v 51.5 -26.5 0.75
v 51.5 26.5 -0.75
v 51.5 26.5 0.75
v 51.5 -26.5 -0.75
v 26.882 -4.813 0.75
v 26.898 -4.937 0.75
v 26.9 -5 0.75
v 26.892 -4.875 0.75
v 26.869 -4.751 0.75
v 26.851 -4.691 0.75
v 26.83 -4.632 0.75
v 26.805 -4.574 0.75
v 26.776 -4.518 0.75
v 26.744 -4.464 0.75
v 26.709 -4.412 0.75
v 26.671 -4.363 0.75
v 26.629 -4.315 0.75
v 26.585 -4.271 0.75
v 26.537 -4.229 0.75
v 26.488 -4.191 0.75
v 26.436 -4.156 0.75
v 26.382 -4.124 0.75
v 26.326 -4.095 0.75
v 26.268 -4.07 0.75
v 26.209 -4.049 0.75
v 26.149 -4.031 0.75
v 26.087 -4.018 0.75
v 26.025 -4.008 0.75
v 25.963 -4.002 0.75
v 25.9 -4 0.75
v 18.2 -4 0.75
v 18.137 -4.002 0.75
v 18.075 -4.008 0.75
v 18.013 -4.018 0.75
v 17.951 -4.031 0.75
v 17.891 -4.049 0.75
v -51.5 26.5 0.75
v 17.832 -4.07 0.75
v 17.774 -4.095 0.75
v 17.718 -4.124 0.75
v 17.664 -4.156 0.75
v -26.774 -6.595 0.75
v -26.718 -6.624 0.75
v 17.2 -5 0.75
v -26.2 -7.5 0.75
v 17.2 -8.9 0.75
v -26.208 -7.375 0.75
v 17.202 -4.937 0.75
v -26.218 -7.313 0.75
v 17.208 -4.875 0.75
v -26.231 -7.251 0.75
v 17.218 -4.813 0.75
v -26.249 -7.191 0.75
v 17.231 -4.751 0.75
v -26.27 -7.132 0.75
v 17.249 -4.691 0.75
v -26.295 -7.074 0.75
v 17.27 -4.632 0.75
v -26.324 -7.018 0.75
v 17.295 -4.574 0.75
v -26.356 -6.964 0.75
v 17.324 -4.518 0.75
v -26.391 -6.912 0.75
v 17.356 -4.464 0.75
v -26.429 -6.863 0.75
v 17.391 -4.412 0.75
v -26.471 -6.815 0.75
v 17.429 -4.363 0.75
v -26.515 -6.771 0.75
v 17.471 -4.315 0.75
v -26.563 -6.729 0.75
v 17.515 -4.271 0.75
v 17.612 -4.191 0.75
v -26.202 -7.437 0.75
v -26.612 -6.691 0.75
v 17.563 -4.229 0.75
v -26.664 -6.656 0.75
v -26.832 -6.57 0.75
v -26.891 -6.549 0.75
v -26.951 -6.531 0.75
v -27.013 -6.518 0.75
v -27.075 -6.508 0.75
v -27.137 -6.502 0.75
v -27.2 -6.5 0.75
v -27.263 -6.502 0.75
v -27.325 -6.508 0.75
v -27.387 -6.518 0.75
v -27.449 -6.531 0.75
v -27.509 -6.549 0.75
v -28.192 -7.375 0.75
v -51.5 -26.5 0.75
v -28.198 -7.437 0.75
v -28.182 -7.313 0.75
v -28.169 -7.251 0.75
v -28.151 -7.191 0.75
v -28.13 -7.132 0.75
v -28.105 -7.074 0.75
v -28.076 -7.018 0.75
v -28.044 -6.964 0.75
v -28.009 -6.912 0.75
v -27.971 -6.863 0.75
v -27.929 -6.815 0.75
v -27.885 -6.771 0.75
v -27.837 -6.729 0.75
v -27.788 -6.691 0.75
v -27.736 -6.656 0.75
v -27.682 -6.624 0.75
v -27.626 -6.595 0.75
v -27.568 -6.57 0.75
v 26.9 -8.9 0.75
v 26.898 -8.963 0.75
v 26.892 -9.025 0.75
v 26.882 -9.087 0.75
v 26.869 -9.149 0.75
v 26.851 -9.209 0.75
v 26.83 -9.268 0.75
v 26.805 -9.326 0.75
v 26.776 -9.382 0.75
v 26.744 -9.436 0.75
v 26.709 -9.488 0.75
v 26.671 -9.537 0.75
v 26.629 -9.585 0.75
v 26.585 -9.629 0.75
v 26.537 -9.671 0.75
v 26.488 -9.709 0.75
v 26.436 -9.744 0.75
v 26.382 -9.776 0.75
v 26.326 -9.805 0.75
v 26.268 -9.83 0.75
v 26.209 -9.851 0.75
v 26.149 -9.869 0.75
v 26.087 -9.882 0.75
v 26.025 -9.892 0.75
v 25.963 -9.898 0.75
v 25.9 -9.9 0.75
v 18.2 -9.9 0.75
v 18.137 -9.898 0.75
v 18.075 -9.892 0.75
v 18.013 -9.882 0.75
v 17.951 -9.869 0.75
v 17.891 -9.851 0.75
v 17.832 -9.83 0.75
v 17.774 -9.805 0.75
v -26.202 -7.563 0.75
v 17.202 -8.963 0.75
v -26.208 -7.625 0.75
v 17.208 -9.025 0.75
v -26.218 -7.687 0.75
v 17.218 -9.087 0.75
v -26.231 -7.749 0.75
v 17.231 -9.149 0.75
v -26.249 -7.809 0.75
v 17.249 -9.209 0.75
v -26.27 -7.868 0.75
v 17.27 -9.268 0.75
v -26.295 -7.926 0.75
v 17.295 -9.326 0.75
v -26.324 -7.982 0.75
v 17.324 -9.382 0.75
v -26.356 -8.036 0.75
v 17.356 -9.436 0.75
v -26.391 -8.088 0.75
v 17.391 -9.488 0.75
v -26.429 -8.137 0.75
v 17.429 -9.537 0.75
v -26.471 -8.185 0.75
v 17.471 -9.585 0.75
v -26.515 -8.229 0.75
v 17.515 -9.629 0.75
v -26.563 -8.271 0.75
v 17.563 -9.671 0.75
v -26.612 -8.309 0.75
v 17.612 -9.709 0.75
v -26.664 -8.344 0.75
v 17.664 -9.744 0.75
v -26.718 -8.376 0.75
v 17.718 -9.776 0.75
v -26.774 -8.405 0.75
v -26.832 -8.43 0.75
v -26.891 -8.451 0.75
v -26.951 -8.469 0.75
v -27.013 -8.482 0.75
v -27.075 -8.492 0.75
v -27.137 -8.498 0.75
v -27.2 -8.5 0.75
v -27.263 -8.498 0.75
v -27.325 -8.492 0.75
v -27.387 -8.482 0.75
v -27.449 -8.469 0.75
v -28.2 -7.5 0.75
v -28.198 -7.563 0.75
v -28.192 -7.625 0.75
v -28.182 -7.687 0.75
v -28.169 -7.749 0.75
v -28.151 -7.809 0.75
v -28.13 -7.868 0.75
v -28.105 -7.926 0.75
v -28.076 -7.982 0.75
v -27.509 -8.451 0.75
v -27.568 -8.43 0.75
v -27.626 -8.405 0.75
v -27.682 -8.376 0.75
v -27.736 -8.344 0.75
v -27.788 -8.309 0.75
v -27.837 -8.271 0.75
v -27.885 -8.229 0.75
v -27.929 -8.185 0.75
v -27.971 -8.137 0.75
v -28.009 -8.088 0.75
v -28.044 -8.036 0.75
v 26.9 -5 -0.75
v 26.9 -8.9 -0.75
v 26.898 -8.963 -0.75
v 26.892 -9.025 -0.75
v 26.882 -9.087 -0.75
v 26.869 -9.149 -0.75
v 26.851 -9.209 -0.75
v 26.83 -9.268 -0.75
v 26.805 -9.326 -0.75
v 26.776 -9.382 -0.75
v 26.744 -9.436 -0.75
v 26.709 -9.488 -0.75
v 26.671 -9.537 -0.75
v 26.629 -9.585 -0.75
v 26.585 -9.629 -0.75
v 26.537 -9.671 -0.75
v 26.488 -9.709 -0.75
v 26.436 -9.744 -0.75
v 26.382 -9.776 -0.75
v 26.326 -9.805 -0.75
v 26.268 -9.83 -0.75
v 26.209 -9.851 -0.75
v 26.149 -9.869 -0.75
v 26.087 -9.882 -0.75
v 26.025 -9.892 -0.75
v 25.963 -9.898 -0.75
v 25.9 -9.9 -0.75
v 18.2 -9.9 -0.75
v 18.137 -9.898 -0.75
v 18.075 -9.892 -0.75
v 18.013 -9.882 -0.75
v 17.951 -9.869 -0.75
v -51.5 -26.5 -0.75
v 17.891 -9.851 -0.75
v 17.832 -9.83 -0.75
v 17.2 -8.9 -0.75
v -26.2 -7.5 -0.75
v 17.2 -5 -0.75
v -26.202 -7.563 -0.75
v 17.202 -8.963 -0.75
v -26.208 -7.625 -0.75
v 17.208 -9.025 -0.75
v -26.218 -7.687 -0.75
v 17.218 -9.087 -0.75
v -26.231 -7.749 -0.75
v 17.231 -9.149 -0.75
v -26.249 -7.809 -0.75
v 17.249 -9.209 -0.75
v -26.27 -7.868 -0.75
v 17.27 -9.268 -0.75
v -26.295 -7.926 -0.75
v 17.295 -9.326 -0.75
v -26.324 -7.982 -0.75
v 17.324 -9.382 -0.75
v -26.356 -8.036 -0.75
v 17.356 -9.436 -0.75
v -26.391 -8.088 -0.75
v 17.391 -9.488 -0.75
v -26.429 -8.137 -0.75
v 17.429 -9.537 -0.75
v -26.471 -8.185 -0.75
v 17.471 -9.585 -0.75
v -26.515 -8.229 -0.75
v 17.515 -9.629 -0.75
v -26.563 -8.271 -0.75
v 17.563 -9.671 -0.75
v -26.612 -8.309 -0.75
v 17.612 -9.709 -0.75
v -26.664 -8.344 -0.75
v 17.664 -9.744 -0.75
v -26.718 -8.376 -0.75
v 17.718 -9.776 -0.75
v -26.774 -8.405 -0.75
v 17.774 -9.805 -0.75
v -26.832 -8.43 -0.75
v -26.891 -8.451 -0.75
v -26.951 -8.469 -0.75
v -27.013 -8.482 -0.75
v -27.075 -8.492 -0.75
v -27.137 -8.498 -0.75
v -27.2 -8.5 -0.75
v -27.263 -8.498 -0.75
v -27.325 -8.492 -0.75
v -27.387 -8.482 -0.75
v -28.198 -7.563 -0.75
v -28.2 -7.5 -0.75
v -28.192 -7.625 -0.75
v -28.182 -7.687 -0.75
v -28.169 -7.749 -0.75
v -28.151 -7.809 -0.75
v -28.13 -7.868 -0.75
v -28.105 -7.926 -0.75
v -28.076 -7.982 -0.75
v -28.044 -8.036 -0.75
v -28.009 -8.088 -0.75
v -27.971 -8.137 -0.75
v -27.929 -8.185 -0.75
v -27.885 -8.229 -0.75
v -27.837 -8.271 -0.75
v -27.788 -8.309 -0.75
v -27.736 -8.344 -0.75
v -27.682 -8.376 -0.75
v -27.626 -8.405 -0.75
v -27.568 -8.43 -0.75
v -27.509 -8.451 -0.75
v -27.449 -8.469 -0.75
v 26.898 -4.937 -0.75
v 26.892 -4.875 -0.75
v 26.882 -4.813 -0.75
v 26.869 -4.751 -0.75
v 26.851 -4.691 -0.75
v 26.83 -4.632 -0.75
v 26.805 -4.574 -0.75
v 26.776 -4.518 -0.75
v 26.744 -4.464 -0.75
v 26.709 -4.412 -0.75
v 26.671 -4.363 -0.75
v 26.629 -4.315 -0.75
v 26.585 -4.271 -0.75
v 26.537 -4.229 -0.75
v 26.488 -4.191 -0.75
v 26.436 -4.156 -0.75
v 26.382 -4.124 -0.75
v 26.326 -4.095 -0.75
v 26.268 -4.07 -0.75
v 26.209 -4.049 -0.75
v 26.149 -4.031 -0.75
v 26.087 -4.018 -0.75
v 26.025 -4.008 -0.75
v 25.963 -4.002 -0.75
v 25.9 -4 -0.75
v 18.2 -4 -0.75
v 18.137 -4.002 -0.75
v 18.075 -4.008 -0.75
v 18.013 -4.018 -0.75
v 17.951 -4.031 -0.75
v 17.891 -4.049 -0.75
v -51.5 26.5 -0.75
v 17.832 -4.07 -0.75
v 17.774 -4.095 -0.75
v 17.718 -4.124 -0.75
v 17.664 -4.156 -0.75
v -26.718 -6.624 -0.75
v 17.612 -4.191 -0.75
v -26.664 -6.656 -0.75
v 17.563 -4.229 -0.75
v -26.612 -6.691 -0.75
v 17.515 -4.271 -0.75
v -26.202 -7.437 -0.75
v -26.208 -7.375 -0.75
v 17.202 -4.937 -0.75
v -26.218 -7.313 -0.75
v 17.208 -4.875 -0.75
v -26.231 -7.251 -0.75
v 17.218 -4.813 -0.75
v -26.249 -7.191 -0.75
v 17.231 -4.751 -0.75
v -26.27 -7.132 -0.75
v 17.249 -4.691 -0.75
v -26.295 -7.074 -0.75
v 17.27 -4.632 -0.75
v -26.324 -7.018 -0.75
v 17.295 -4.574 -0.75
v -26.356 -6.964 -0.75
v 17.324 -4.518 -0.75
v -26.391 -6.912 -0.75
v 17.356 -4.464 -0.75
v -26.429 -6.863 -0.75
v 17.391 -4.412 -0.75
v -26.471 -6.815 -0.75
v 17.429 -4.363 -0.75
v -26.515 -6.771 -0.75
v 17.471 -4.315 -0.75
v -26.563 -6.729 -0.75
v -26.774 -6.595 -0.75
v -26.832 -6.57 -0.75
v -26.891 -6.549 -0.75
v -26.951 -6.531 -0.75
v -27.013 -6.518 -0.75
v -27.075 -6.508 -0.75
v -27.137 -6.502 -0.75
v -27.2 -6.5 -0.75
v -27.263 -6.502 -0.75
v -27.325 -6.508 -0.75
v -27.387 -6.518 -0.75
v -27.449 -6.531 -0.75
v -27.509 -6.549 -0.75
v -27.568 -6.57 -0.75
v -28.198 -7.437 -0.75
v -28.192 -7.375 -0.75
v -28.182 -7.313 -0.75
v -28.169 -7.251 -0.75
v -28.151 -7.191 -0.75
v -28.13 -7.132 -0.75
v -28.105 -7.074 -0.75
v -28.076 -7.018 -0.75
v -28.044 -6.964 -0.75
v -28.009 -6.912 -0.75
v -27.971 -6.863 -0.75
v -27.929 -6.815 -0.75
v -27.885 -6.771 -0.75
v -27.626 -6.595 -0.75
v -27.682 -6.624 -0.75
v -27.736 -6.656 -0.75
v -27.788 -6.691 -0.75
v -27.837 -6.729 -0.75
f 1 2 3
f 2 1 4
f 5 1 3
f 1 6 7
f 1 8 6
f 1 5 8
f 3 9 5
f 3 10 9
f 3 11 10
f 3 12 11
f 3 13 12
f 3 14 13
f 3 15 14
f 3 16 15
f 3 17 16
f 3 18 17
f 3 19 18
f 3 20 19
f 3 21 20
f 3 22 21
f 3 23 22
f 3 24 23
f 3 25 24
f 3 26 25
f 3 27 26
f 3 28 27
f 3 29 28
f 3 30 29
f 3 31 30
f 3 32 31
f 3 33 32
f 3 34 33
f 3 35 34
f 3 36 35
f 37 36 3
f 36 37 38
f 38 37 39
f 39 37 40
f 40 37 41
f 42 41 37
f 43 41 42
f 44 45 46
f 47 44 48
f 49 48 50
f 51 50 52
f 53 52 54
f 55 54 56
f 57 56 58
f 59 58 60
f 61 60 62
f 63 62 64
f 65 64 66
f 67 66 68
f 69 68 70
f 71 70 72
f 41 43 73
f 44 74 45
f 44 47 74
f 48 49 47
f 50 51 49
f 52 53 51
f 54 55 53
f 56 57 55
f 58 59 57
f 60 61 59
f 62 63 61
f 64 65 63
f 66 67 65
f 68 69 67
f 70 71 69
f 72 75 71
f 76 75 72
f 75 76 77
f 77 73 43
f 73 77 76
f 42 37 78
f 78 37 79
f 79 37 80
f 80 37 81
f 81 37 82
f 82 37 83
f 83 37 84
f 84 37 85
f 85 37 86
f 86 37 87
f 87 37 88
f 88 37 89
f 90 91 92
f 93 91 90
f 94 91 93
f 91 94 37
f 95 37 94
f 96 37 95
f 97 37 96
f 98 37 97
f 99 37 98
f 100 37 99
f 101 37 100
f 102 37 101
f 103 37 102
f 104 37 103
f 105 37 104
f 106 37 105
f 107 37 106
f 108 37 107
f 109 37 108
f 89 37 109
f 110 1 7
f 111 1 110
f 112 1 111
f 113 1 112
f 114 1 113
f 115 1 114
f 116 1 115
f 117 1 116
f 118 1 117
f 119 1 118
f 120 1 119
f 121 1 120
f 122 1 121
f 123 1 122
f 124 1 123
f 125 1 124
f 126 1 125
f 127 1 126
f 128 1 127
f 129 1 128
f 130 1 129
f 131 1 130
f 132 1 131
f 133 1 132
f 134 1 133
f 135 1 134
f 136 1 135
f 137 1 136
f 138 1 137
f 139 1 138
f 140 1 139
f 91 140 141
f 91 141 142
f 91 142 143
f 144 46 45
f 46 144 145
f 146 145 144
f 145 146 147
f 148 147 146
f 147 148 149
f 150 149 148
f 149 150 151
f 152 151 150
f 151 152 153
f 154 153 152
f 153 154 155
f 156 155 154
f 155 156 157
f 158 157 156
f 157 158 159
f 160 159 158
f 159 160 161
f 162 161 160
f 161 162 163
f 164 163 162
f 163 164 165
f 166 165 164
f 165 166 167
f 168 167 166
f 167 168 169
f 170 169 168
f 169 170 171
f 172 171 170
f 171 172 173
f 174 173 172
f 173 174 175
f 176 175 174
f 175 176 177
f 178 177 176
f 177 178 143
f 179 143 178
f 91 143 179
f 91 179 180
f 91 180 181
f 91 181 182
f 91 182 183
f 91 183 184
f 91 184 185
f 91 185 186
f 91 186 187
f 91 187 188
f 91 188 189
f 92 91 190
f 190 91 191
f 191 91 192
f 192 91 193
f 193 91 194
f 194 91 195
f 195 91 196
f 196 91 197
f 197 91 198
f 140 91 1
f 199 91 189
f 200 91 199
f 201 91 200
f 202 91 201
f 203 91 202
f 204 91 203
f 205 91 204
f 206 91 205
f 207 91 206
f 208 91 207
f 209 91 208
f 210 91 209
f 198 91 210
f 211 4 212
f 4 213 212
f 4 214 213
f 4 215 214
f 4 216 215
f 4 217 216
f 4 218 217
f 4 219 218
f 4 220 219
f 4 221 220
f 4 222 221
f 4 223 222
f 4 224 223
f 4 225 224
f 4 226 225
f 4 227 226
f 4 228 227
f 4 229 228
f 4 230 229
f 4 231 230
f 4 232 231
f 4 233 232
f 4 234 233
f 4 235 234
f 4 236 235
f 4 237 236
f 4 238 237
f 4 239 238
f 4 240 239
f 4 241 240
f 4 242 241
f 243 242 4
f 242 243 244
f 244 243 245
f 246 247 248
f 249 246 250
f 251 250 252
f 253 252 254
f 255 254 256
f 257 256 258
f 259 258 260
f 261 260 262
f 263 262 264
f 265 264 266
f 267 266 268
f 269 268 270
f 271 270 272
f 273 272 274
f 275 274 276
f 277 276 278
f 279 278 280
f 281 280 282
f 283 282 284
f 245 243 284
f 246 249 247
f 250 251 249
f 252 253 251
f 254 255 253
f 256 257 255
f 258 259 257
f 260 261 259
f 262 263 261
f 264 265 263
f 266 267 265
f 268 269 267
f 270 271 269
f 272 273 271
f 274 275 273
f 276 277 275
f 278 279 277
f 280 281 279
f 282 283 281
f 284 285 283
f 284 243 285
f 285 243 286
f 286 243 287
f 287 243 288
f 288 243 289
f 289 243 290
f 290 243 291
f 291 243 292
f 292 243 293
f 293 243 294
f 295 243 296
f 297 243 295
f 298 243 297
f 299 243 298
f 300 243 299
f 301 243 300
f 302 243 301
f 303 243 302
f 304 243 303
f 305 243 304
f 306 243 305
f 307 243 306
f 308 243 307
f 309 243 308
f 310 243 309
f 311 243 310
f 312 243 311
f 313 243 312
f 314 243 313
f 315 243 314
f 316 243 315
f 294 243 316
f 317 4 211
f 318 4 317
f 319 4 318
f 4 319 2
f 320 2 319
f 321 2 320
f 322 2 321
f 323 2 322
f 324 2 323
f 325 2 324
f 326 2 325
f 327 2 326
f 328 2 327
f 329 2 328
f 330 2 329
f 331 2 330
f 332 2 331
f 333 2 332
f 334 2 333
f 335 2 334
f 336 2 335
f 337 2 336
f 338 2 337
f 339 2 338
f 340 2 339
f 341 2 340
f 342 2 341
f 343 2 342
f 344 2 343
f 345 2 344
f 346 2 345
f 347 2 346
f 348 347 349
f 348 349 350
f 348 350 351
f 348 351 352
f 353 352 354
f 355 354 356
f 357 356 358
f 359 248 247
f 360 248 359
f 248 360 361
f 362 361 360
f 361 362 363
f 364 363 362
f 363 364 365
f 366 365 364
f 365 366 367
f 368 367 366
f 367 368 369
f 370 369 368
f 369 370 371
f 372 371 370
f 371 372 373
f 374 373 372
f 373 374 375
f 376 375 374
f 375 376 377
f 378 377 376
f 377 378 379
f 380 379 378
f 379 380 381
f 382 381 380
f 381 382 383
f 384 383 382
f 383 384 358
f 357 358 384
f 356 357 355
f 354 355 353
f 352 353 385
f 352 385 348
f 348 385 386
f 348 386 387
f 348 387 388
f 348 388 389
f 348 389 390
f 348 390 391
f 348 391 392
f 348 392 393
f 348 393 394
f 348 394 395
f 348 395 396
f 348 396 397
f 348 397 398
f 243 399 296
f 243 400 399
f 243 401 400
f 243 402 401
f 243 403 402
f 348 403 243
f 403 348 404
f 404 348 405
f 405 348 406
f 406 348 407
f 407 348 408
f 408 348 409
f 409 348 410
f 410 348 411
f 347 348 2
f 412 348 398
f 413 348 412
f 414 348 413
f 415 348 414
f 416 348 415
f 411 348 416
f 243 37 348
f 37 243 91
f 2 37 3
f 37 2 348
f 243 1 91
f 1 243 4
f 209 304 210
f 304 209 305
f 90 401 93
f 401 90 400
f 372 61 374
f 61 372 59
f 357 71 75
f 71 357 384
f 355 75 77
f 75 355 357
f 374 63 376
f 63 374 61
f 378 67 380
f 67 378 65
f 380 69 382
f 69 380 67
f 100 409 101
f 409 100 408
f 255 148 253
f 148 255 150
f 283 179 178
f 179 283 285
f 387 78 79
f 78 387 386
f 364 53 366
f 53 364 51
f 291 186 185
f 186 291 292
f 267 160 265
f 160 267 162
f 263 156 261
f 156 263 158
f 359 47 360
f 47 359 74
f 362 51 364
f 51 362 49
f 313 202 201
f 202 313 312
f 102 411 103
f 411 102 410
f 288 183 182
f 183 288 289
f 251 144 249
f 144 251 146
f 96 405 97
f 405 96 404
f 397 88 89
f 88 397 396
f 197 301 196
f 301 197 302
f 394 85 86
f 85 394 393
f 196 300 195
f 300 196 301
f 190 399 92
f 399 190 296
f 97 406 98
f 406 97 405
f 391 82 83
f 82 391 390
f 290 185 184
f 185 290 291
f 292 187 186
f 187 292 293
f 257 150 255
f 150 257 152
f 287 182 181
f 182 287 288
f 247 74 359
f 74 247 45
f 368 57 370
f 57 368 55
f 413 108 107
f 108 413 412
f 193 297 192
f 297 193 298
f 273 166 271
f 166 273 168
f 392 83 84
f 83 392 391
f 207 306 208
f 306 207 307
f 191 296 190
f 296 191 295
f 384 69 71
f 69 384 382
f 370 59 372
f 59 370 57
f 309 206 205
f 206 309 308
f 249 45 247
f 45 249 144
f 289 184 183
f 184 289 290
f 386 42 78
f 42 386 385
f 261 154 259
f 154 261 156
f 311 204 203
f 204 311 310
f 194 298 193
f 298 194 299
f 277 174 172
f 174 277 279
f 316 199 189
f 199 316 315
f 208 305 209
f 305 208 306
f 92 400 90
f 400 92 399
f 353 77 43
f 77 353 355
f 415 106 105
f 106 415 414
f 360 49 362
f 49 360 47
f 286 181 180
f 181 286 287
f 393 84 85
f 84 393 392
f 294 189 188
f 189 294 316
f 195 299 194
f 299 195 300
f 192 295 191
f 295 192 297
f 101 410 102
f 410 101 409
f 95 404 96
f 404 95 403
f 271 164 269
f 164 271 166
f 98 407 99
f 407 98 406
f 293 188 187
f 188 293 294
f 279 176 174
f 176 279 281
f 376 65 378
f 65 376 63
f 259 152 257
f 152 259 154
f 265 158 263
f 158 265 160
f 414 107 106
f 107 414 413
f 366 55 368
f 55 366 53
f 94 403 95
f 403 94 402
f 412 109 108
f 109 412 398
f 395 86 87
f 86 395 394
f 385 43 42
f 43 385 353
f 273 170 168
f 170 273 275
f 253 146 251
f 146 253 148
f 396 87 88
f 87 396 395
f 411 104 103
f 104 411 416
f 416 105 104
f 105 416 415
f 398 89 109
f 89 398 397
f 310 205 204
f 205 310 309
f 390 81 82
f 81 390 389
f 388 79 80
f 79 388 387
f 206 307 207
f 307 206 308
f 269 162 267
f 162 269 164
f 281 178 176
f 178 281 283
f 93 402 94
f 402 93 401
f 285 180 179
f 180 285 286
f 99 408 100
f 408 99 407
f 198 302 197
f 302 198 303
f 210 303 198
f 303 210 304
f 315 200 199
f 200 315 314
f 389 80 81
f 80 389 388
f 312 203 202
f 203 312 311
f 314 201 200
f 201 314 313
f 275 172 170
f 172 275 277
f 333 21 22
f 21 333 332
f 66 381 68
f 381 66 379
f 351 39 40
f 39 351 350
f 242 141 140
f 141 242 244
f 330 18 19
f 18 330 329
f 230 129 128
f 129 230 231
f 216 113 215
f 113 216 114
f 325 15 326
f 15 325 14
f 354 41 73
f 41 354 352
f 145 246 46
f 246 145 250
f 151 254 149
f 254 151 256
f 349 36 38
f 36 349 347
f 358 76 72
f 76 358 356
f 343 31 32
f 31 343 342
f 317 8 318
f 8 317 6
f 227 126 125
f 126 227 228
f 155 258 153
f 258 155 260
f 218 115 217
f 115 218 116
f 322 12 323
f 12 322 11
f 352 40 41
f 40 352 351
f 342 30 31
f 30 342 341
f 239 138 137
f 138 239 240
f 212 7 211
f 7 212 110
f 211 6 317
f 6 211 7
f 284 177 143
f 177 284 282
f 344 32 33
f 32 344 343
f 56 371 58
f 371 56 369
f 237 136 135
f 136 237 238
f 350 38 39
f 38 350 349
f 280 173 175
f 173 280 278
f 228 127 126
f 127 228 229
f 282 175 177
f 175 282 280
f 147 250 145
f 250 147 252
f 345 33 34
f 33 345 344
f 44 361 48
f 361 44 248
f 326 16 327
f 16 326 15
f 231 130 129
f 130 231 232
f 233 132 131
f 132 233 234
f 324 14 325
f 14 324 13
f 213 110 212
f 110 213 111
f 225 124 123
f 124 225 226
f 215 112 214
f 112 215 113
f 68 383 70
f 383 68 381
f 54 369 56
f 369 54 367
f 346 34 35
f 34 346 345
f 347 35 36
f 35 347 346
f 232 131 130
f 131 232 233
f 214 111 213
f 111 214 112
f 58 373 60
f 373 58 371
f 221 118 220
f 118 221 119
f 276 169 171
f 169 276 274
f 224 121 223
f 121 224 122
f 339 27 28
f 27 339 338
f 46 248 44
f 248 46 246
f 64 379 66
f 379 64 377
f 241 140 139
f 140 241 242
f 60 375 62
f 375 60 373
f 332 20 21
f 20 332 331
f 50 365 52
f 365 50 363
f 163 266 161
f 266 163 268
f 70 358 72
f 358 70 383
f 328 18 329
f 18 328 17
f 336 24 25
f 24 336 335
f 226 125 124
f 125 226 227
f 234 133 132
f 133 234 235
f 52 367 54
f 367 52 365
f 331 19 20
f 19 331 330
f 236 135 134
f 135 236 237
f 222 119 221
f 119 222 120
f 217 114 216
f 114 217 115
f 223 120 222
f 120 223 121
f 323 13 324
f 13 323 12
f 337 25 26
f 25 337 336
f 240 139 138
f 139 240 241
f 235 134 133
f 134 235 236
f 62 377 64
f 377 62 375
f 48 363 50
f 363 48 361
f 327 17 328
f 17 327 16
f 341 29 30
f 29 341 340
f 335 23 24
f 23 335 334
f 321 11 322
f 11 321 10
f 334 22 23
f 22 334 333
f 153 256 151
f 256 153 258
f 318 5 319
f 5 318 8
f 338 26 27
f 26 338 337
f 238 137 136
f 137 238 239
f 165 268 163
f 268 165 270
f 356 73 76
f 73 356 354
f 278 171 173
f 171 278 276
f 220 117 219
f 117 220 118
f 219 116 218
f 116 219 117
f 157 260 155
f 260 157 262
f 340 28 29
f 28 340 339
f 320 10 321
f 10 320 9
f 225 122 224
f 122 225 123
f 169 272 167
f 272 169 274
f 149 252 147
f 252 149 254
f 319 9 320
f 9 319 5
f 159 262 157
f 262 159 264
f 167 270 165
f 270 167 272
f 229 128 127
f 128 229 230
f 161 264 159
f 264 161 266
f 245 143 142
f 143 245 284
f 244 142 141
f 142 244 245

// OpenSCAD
//CELICKO PREDNI
//---------------------------------------
$fn=100;
//PARAMETRY CELICKA OD VYROBCE
//rozměr čelíčka
celicko_x=103;
celicko_y=53;
celicko_z=1.5;

//otvory v celisku od vyrobce
celicko_dira_prumer=3.5;
celicko_dira_souradniceX=95.02/2; //souradnice od stredu celicka
celicko_dira_souradniceY=45/2;    //souradnice od stredu celicka
//---------------------------------------

//PRUMER FREZY
freza_prumer=2;

//OTVORY FREZA
//otvor_1 - pro LED
otvor1_prumer=2;
otvor1_souradniceX=-27.2; //souradnice od stredu celicka
otvor1_souradniceY=-7.5; //souradnice od stredu celicka

//otvor_2 - pro vypinac
otvor2_rozmerX=7.7; //rozměry čisté bez úprav pro frézování
otvor2_rozmerY=5.9; //rozměry čisté bez úprav pro frézování
otvor2_souradniceX=22.05; //souradnice od stredu celicka
otvor2_souradniceY=-6.95; //souradnice od stredu celicka
//---------------------------------------

CELICKO_VYSLEDNE();

module CELICKO_VYSLEDNE(){
    difference() {
        CELICKO_OD_VYROBCE();
    
        //otvor1
        translate([otvor1_souradniceX,otvor1_souradniceY,0])  
            cylinder(celicko_z+0.01, d=otvor1_prumer, center=true);   

        //otvor2
        translate([otvor2_souradniceX,otvor2_souradniceY,0])  
            minkowski() {
                cube([otvor2_rozmerX, otvor2_rozmerY-freza_prumer, celicko_z], center=true);
                cylinder(r=freza_prumer/2,h=0.01, center=true);
            } 
    } 
} 

module CELICKO_OD_VYROBCE(){
    difference() {
        cube([celicko_x,celicko_y,celicko_z],center=true);

/*
//otvory na srouby    
translate([celicko_dira_souradniceX,celicko_dira_souradniceY,0])  
    cylinder(celicko_z+0.01, d=celicko_dira_prumer, center=true);   
     zakomentováno díry neodpovídají realitě, značná nepřesnost výrobce
translate([-celicko_dira_souradniceX,celicko_dira_souradniceY,0])  
    cylinder(celicko_z+0.01, d=celicko_dira_prumer, center=true); 

translate([celicko_dira_souradniceX,-celicko_dira_souradniceY,0])  
    cylinder(celicko_z+0.01, d=celicko_dira_prumer, center=true); 

translate([-celicko_dira_souradniceX,-celicko_dira_souradniceY,0])  
    cylinder(celicko_z+0.01, d=celicko_dira_prumer, center=true);  
   */ 
} 
} 
